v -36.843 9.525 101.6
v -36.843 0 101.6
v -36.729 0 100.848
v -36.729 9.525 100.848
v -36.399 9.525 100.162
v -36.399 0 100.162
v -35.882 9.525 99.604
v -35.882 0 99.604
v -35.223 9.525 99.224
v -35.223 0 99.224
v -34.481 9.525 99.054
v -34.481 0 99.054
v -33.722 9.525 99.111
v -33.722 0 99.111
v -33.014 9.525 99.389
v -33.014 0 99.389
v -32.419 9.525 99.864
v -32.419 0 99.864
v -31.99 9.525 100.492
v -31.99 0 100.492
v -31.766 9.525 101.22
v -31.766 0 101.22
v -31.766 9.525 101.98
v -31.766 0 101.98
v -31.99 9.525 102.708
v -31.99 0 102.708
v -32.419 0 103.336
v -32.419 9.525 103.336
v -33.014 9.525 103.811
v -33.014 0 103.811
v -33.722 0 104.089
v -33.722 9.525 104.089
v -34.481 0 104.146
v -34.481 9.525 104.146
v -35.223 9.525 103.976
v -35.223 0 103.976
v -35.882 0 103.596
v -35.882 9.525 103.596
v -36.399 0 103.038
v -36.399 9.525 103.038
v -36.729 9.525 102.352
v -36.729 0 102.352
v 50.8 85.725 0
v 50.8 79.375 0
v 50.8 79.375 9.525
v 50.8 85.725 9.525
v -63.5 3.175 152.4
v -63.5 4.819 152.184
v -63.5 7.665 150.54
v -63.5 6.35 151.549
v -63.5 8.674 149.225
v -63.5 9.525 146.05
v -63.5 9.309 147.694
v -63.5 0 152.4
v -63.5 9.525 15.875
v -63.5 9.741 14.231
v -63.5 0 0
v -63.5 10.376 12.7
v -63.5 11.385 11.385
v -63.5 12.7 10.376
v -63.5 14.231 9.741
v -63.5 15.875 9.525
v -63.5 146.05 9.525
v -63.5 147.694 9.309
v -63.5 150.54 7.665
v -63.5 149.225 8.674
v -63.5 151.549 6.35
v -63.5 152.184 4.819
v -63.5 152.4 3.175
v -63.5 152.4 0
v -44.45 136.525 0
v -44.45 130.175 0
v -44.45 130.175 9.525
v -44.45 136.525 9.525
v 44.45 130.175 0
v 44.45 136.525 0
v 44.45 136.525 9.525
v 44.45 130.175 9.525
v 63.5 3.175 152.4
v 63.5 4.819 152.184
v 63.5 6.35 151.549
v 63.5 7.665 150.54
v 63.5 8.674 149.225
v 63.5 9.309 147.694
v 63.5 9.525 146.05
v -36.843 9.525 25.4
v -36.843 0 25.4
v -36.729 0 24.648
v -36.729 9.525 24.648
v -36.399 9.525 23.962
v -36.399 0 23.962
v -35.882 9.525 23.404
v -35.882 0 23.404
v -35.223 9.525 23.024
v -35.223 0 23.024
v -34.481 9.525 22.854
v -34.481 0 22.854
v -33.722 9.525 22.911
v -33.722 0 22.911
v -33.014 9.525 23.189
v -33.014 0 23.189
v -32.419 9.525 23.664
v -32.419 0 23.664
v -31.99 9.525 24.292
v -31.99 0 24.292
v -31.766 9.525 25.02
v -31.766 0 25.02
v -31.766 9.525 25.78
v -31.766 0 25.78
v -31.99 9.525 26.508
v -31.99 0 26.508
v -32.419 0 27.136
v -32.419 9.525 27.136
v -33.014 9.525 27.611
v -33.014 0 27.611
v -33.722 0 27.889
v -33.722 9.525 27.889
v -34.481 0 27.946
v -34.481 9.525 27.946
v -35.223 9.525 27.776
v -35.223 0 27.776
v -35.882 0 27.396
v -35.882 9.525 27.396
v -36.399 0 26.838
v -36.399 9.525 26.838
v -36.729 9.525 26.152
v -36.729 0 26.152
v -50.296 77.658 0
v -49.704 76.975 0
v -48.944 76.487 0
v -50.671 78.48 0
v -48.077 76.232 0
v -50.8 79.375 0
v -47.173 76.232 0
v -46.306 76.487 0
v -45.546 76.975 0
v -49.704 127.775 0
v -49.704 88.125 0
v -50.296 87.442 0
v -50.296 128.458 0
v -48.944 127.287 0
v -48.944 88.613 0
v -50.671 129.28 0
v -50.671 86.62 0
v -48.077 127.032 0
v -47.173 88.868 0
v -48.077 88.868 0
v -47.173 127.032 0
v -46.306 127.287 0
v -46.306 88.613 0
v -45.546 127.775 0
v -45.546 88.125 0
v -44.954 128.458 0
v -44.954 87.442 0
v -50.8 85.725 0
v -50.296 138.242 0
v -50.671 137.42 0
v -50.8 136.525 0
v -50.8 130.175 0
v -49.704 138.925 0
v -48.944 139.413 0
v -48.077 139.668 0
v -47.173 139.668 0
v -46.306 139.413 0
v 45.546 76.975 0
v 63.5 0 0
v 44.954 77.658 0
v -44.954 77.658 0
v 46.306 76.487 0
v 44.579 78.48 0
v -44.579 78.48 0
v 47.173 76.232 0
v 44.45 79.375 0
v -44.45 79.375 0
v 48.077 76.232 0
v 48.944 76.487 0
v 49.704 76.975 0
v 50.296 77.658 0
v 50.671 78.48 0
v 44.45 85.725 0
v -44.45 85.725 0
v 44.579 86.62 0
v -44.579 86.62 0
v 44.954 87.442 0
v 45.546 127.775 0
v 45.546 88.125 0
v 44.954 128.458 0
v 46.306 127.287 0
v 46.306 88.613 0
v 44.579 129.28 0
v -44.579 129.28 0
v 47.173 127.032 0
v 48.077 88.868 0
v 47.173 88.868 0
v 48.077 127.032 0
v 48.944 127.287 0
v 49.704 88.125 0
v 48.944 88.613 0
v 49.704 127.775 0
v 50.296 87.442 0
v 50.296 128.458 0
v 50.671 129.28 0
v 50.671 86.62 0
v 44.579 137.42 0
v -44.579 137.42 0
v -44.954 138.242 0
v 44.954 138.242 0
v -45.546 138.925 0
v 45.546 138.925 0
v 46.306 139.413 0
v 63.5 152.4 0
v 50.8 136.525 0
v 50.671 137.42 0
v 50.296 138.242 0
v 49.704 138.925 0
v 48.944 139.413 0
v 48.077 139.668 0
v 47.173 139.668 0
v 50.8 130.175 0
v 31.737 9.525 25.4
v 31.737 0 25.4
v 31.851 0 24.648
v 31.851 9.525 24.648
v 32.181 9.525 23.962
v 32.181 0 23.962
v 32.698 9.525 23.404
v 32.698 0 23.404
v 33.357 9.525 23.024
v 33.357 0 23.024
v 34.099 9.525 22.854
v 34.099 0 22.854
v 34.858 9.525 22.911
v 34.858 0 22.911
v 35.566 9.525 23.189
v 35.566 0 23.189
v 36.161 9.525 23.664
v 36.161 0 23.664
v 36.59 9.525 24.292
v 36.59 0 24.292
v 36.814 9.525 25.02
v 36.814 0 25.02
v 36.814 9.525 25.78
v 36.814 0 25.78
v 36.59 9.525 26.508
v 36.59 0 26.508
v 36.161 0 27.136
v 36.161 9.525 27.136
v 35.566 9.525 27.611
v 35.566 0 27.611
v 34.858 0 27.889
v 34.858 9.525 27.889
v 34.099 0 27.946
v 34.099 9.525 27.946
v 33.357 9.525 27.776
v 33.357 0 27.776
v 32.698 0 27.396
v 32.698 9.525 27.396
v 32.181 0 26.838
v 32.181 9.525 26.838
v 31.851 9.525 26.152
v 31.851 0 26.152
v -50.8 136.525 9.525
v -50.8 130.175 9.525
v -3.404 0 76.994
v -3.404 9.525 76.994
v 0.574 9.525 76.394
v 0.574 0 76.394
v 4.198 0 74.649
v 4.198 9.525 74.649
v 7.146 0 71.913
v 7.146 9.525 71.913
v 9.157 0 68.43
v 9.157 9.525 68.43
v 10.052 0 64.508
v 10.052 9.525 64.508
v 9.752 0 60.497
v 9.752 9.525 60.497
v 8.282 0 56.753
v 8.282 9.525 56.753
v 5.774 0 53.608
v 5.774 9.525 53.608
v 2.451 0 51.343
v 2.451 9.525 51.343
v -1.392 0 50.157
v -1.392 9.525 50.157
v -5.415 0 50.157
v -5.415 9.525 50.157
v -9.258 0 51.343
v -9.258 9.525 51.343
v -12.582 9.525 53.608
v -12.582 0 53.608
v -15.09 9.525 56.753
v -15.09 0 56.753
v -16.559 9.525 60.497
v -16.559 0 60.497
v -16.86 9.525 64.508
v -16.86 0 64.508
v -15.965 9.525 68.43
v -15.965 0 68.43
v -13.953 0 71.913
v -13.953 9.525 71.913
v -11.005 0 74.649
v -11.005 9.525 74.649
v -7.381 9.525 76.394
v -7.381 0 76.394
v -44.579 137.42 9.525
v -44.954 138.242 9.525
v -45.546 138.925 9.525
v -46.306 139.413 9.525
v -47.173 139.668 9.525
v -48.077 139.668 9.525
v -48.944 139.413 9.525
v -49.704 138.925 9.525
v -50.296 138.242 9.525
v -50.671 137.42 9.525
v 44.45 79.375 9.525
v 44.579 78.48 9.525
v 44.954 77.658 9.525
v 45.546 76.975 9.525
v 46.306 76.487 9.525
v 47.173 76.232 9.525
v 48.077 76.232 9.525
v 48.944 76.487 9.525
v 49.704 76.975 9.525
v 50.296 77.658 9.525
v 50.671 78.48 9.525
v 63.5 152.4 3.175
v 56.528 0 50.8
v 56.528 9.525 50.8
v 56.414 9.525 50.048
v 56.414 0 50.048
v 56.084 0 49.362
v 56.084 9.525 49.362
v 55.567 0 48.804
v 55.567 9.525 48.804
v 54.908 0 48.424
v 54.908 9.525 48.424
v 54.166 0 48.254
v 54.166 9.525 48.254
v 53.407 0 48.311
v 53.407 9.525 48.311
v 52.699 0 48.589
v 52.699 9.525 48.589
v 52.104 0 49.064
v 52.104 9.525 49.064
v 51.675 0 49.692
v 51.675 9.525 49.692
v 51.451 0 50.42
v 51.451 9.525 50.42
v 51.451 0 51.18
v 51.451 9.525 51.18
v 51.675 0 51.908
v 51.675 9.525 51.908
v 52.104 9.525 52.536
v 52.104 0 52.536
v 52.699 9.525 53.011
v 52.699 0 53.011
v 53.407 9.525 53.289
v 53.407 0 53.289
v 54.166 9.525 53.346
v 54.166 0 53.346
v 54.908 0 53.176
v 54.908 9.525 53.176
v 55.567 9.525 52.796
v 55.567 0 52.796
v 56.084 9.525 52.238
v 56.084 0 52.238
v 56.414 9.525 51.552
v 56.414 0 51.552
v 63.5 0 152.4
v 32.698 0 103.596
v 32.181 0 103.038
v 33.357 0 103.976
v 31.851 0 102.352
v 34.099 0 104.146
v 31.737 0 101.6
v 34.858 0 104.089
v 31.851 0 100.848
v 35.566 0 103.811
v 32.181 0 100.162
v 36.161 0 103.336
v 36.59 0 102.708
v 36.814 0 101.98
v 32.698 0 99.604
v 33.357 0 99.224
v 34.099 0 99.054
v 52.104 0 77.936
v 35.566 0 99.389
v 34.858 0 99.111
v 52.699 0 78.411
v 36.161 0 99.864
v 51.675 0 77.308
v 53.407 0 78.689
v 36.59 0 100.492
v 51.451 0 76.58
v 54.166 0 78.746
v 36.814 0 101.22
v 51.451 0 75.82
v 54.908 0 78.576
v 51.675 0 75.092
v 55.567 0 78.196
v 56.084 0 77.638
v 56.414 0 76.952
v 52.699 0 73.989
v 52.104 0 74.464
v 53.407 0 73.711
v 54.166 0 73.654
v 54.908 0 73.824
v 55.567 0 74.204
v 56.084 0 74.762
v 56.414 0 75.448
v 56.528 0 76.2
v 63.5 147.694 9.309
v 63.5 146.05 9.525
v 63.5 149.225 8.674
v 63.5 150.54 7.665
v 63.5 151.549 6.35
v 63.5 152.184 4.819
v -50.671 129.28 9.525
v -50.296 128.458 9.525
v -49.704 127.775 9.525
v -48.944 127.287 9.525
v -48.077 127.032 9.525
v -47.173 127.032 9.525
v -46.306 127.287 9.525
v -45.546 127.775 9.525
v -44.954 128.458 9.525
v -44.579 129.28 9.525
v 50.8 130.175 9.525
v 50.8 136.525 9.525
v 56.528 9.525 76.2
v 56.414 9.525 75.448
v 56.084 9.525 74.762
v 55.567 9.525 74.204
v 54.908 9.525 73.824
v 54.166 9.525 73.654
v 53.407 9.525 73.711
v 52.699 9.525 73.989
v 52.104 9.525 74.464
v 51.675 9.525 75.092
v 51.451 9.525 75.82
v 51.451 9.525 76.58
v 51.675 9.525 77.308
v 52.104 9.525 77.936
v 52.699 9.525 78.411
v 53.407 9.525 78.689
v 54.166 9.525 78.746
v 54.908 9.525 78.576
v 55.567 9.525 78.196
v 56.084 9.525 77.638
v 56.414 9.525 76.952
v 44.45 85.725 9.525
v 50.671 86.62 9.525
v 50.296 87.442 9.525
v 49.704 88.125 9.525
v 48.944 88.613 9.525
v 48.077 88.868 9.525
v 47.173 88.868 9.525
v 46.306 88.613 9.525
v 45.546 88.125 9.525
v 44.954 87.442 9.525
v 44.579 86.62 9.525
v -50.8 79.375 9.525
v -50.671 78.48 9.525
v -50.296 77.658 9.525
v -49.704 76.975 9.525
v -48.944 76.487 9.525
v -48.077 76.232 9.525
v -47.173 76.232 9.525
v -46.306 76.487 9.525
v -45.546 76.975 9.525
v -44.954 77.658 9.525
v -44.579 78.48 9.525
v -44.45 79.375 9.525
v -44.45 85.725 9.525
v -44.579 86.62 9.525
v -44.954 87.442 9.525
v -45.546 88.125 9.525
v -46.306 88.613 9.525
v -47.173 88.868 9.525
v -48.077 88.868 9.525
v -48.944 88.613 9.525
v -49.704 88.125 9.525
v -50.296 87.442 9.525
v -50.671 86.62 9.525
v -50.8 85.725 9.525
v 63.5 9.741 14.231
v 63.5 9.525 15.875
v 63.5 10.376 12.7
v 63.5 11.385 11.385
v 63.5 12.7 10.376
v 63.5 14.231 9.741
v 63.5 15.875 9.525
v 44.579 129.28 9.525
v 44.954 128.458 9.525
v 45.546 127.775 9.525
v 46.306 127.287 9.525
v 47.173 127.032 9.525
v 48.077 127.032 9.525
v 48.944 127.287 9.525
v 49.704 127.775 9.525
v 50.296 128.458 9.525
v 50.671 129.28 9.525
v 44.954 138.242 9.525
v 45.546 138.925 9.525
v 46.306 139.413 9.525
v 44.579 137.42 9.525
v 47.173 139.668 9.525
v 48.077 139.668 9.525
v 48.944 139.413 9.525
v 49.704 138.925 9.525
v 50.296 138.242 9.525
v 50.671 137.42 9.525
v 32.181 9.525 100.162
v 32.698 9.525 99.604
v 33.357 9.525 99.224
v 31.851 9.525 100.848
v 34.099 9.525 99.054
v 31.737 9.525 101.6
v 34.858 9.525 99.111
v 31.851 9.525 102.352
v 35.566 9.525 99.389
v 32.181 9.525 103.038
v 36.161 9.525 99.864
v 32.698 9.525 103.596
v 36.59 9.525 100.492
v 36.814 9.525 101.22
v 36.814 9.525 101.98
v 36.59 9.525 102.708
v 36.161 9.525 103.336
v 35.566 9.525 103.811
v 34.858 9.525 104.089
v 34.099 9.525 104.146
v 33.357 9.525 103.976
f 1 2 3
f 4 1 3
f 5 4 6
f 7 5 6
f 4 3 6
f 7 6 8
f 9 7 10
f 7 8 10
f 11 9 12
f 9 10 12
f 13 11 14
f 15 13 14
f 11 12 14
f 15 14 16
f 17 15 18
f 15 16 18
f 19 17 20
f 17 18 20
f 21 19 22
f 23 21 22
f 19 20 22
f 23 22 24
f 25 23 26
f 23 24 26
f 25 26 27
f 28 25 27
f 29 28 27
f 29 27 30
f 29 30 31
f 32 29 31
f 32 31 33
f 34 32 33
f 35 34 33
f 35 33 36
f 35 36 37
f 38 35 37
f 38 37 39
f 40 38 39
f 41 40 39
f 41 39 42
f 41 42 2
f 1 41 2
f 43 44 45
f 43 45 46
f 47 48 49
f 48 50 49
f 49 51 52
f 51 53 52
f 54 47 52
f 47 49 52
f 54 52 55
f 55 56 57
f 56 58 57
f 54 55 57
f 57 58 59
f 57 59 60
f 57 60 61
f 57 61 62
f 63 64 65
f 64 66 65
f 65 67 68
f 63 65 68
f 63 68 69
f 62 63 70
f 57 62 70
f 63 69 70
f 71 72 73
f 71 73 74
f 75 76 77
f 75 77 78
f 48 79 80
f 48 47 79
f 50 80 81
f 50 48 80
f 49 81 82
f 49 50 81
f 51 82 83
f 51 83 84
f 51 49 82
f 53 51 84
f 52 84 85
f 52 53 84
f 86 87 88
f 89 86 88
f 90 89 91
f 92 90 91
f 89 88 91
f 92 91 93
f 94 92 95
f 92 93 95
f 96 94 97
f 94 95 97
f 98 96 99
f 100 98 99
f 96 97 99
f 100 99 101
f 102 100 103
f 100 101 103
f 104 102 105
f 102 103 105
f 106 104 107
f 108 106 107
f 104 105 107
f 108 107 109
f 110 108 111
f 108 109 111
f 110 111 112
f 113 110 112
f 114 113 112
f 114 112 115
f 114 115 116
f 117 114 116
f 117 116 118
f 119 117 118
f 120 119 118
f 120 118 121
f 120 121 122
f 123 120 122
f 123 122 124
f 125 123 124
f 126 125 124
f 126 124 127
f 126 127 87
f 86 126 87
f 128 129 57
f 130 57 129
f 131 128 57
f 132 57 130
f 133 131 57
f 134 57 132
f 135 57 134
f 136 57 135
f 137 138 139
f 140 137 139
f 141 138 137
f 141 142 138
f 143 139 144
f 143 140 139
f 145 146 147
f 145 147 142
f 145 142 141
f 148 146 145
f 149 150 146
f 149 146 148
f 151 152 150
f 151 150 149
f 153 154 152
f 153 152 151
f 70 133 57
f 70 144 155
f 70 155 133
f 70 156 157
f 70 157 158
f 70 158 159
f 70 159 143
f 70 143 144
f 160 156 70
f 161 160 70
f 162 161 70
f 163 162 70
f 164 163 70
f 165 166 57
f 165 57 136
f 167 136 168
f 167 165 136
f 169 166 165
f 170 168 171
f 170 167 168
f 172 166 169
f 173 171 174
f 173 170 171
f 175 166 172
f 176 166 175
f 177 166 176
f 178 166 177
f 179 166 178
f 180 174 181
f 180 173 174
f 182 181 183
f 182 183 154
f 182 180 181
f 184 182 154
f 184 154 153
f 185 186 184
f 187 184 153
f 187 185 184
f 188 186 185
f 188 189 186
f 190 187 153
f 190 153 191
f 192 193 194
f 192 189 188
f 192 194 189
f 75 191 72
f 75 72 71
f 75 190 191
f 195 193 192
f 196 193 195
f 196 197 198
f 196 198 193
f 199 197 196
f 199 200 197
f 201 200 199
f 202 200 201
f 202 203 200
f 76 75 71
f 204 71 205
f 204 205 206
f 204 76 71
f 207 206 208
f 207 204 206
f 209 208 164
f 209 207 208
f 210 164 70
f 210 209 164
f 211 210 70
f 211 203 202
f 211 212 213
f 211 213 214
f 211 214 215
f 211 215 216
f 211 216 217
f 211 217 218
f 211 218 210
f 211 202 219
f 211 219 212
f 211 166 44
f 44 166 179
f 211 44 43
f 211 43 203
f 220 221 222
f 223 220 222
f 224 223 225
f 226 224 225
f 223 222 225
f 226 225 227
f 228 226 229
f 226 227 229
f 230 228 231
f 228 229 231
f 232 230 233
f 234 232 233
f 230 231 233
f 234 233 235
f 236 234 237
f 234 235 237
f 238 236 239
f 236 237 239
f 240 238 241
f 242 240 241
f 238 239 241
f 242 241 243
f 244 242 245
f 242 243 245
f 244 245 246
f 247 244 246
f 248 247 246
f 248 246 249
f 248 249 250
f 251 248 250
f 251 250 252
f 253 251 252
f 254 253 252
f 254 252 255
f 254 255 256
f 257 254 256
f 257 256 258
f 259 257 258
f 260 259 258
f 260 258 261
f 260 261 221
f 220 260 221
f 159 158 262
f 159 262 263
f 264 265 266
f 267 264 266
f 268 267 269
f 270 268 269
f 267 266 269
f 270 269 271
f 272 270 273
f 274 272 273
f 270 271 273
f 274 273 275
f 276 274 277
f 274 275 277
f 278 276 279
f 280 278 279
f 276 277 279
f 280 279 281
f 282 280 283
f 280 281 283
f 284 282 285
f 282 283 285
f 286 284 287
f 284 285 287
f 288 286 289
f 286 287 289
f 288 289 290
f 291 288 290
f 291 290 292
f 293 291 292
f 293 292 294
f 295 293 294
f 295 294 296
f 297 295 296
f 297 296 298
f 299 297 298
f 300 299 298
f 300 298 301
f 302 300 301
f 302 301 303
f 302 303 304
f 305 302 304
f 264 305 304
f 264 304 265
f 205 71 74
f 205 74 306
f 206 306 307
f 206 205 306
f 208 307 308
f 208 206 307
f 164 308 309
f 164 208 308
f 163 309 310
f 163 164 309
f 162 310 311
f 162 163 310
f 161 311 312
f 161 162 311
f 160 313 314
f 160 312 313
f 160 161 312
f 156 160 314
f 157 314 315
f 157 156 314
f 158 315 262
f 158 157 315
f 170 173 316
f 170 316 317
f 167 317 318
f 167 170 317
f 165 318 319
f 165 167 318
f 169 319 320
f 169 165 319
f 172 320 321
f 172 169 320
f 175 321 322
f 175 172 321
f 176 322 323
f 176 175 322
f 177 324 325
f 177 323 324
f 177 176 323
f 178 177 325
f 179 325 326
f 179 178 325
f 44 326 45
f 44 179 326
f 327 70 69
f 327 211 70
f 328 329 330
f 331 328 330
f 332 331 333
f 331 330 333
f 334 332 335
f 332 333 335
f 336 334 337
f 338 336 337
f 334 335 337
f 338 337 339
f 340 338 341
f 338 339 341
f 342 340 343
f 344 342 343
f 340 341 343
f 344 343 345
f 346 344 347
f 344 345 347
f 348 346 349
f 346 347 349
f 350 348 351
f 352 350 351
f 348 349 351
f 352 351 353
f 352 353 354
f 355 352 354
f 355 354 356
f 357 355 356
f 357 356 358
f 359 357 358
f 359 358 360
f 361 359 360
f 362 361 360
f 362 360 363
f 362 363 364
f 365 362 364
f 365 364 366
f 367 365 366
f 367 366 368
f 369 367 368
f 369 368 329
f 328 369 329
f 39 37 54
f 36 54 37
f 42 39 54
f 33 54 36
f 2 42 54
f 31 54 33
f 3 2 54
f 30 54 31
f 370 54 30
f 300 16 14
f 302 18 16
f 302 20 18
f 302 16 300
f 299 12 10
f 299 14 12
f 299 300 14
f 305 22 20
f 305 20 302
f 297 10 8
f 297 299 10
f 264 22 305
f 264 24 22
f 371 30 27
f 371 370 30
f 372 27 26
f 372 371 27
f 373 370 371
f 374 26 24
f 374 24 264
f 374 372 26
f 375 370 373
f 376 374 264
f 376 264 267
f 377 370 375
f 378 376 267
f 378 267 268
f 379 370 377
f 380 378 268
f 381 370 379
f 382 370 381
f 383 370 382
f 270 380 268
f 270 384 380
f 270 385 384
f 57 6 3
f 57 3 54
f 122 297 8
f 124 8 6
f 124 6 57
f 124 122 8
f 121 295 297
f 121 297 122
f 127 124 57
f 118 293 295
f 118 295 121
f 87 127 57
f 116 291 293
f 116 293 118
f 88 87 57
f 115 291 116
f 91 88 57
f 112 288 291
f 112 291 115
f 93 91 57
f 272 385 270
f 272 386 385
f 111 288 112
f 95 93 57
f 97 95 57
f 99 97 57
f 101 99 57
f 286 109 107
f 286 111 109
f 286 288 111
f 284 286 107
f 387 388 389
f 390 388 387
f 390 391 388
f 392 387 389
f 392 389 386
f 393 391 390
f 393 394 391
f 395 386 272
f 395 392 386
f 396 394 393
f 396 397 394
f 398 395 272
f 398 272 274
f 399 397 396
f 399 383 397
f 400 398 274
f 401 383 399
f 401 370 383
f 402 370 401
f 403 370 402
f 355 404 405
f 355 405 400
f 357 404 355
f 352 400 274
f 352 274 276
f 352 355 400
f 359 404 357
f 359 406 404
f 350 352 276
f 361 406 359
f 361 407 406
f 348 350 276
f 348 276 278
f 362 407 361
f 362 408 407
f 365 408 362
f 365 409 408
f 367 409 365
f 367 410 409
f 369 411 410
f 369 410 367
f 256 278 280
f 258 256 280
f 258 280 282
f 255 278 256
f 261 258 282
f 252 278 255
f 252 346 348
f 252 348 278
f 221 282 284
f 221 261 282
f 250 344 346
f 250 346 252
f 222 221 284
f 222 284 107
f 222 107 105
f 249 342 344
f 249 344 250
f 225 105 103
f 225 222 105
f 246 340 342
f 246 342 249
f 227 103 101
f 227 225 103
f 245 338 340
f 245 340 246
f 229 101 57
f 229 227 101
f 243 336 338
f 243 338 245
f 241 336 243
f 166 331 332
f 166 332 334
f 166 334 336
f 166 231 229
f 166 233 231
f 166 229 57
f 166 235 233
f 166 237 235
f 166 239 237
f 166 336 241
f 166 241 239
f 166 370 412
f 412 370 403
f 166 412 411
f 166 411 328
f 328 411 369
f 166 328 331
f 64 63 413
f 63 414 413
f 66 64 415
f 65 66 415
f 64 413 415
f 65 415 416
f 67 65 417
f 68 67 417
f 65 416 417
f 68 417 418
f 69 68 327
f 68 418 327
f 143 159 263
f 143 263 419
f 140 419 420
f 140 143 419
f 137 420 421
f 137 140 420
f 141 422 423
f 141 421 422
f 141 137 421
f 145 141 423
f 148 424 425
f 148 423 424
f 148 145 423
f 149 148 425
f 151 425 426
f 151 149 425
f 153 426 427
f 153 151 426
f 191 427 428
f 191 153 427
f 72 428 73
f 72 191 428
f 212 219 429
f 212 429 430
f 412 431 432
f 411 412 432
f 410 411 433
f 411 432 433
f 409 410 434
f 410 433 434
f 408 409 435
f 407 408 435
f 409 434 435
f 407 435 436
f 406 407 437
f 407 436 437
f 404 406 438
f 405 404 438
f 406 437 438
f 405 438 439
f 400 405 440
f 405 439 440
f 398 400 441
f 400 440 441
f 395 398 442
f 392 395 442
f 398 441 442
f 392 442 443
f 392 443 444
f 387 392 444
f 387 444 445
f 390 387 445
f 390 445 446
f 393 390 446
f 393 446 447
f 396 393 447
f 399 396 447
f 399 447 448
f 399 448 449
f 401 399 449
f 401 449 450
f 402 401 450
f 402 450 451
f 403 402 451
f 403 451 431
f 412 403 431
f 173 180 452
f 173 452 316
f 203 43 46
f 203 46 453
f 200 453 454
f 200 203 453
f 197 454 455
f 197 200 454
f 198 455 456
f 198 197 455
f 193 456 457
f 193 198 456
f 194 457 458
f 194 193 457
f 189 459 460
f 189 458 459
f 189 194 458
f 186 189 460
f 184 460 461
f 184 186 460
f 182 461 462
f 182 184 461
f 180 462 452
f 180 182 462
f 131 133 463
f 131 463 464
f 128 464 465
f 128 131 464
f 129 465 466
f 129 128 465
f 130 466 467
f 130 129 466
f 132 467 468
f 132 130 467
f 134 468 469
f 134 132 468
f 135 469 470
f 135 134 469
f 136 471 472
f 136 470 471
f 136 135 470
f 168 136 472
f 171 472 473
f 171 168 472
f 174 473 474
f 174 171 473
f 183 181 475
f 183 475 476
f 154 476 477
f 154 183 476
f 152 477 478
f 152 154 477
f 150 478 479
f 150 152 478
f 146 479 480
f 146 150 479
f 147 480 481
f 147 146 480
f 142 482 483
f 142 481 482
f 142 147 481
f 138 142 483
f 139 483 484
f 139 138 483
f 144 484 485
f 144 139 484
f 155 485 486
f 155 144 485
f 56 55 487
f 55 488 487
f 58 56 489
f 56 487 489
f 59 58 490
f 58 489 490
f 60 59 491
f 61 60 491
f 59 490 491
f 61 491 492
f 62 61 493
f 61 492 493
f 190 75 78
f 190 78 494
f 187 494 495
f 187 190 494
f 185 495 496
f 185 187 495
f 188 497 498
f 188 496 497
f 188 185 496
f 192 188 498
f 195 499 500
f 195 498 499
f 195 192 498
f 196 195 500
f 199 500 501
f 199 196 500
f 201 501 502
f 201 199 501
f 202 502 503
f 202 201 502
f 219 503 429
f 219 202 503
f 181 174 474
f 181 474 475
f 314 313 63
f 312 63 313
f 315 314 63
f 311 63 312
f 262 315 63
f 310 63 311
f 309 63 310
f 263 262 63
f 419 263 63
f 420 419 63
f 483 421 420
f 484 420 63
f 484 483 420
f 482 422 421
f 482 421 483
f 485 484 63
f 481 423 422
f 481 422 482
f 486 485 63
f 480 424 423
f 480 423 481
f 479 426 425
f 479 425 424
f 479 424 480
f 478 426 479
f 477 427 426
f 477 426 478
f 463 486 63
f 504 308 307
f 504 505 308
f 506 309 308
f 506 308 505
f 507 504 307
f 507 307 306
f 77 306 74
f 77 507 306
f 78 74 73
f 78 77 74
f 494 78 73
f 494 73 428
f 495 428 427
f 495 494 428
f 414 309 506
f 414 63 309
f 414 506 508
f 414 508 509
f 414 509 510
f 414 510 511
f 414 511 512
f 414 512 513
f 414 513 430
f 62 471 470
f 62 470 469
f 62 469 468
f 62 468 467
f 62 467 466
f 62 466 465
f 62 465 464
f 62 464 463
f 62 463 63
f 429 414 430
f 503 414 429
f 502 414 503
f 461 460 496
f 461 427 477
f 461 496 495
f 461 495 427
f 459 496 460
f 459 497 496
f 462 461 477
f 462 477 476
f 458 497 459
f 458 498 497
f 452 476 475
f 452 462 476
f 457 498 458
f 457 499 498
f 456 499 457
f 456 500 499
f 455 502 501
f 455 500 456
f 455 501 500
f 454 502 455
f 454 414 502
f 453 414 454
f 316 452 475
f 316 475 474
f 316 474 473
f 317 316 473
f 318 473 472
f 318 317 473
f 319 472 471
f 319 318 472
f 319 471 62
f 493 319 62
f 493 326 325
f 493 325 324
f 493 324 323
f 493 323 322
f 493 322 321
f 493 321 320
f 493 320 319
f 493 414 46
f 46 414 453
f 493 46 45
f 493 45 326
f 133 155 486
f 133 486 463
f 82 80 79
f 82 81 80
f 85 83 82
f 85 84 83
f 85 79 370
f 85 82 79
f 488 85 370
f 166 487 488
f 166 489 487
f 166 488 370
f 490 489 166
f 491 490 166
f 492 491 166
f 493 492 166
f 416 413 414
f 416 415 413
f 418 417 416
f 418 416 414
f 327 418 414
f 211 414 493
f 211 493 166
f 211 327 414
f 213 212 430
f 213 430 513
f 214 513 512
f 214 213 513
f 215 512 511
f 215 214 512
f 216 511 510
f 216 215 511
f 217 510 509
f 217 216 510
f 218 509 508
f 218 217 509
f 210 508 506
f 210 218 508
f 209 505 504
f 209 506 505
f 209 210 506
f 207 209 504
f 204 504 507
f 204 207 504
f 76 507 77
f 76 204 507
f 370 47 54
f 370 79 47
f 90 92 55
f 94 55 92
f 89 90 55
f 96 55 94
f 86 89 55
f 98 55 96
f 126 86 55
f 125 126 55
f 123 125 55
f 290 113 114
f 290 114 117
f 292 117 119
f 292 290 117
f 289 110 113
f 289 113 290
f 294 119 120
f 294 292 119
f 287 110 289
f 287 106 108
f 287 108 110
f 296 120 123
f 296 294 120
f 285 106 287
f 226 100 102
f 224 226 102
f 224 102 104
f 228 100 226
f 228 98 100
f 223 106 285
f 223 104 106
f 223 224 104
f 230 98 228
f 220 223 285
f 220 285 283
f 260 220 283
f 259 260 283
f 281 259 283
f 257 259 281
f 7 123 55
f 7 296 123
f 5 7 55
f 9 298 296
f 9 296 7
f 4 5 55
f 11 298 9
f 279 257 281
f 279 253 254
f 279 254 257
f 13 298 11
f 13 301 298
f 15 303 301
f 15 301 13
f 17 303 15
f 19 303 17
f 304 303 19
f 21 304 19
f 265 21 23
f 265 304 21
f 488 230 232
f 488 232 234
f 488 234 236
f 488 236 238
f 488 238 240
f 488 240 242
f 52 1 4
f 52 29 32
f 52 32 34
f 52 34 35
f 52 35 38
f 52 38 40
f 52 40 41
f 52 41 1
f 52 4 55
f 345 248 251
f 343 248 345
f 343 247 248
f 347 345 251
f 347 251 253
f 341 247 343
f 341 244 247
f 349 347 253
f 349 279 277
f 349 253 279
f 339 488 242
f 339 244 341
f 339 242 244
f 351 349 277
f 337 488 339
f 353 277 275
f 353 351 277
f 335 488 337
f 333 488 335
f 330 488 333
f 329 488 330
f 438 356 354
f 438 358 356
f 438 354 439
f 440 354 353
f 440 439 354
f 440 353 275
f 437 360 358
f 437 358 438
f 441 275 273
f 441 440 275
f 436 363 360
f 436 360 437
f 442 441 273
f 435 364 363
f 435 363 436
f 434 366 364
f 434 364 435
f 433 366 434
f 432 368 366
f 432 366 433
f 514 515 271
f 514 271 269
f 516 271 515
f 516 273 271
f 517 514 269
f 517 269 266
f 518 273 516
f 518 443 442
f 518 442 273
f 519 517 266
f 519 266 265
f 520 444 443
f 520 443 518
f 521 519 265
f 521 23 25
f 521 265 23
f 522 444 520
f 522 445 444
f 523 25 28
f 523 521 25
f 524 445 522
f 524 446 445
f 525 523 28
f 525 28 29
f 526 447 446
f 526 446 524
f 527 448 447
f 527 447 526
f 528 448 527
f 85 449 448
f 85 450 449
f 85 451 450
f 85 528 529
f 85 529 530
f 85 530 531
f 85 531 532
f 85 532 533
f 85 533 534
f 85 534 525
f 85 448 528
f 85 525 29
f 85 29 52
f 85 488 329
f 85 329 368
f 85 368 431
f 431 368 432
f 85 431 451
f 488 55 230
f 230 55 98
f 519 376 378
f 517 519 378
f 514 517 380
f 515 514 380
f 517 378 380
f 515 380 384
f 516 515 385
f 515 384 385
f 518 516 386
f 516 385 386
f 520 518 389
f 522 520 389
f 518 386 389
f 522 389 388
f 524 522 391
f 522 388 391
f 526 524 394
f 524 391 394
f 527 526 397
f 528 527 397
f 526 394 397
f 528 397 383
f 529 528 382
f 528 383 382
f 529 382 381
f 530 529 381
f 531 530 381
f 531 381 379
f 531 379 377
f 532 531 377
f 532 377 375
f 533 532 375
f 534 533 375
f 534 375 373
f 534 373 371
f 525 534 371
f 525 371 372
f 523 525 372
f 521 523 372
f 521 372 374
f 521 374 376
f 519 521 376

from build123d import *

# Parameters (mm, degrees)
F_6_X_6_ANGLE_BAR_EXTRUSION_DEPTH = 63.5
EXTRUSION_FILLETS_R               = 6.35
F_10_CLEARANCE_HOLE_ROUTER_D      = 5.1054
SKETCH7_R                         = 13.49375
F_1_OD_BIT_ACCESS_HOLE_DEPTH      = 219.337526836
TAPPED_HOLE_FOR_10_32_HELICOIL1_D = 5.1054
MOUNTING_SLOTS_REACH              = 226.686


with BuildPart() as part:
    # Sketch1 → 6" x 6" angle bar extrusion (new, symmetric)
    with BuildSketch(Plane(origin=(0, 0, 0), x_dir=(0, 0, -1), z_dir=(1, 0, 0))):
        Polygon((0, 0), (0, 152.4), (-9.525, 152.4), (-9.525, 9.525), (-152.4, 9.525), (-152.4, 0), align=None)
    extrude(amount=F_6_X_6_ANGLE_BAR_EXTRUSION_DEPTH, both=True)

    # extrusion fillets
    extrusion_fillets_edges = [part.edges().sort_by_distance(p)[0] for p in [
        (0, 9.525, 152.4),
        (0, 9.525, 9.525),
        (0, 152.4, 9.525),
    ]]
    fillet(extrusion_fillets_edges, radius=EXTRUSION_FILLETS_R)

    # #10 Clearance Hole - router (through all)
    with Locations(Plane(origin=(0, 9.525, 0), x_dir=(1, 0, 0), z_dir=(0, 1, 0))):
        with Locations((-34.29, -25.4), (34.29, -101.6), (-34.29, -101.6), (34.29, -25.4)):
            Hole(F_10_CLEARANCE_HOLE_ROUTER_D / 2)

    # Sketch7 → 1" OD bit access hole (cut, through all)
    with BuildSketch(Plane(origin=(0, 9.525, 0), x_dir=(1, 0, 0), z_dir=(0, 1, 0))):
        with Locations(Location((-3.4036, -63.5, 0), (0, 0, 270))):
            Circle(SKETCH7_R)
    extrude(amount=-F_1_OD_BIT_ACCESS_HOLE_DEPTH, mode=Mode.SUBTRACT)

    # Tapped Hole for #10-32 Helicoil1 (through all)
    with Locations(Plane(origin=(0, 0, 0), x_dir=(-1, 0, 0), z_dir=(0, -1, 0))):
        with Locations((-53.975, -50.8), (-53.975, -76.2)):
            Hole(TAPPED_HOLE_FOR_10_32_HELICOIL1_D / 2)

    # Sketch14 → mounting slots (cut, up to next)
    with BuildSketch(Plane(origin=(0, 0, 0), x_dir=(-1, 0, 0), z_dir=(0, 0, -1)), mode=Mode.PRIVATE) as mounting_slots_sk1:
        with BuildLine():
            Line((-44.45, 136.525), (-44.45, 130.175))
            ThreePointArc((-44.45, 130.175), (-47.625, 127), (-50.8, 130.175))
            Line((-50.8, 130.175), (-50.8, 136.525))
            ThreePointArc((-50.8, 136.525), (-47.625, 139.7), (-44.45, 136.525))
        make_face()
    mounting_slots_tool1 = extrude(mounting_slots_sk1.sketch, amount=-MOUNTING_SLOTS_REACH, mode=Mode.PRIVATE) & part.part
    # Sketch14 → mounting slots (cut, up to next)
    with BuildSketch(Plane(origin=(0, 0, 0), x_dir=(-1, 0, 0), z_dir=(0, 0, -1)), mode=Mode.PRIVATE) as mounting_slots_sk2:
        with BuildLine():
            Line((-44.45, 85.725), (-44.45, 79.375))
            ThreePointArc((-44.45, 79.375), (-47.625, 76.2), (-50.8, 79.375))
            Line((-50.8, 79.375), (-50.8, 85.725))
            ThreePointArc((-50.8, 85.725), (-47.625, 88.9), (-44.45, 85.725))
        make_face()
    mounting_slots_tool2 = extrude(mounting_slots_sk2.sketch, amount=-MOUNTING_SLOTS_REACH, mode=Mode.PRIVATE) & part.part
    # Sketch14 → mounting slots (cut, up to next)
    with BuildSketch(Plane(origin=(0, 0, 0), x_dir=(-1, 0, 0), z_dir=(0, 0, -1)), mode=Mode.PRIVATE) as mounting_slots_sk3:
        with BuildLine():
            Line((50.8, 85.725), (50.8, 79.375))
            ThreePointArc((50.8, 79.375), (47.625, 76.2), (44.45, 79.375))
            Line((44.45, 79.375), (44.45, 85.725))
            ThreePointArc((44.45, 85.725), (47.625, 88.9), (50.8, 85.725))
        make_face()
    mounting_slots_tool3 = extrude(mounting_slots_sk3.sketch, amount=-MOUNTING_SLOTS_REACH, mode=Mode.PRIVATE) & part.part
    # Sketch14 → mounting slots (cut, up to next)
    with BuildSketch(Plane(origin=(0, 0, 0), x_dir=(-1, 0, 0), z_dir=(0, 0, -1)), mode=Mode.PRIVATE) as mounting_slots_sk4:
        with BuildLine():
            Line((50.8, 136.525), (50.8, 130.175))
            ThreePointArc((50.8, 130.175), (47.625, 127), (44.45, 130.175))
            Line((44.45, 130.175), (44.45, 136.525))
            ThreePointArc((44.45, 136.525), (47.625, 139.7), (50.8, 136.525))
        make_face()
    mounting_slots_tool4 = extrude(mounting_slots_sk4.sketch, amount=-MOUNTING_SLOTS_REACH, mode=Mode.PRIVATE) & part.part
    add(mounting_slots_tool1.solids().sort_by_distance((47.625, 133.35, 0))[0], mode=Mode.SUBTRACT)
    add(mounting_slots_tool2.solids().sort_by_distance((47.625, 82.55, 0))[0], mode=Mode.SUBTRACT)
    add(mounting_slots_tool3.solids().sort_by_distance((-47.625, 82.55, 0))[0], mode=Mode.SUBTRACT)
    add(mounting_slots_tool4.solids().sort_by_distance((-47.625, 133.35, 0))[0], mode=Mode.SUBTRACT)


solid = part.part
